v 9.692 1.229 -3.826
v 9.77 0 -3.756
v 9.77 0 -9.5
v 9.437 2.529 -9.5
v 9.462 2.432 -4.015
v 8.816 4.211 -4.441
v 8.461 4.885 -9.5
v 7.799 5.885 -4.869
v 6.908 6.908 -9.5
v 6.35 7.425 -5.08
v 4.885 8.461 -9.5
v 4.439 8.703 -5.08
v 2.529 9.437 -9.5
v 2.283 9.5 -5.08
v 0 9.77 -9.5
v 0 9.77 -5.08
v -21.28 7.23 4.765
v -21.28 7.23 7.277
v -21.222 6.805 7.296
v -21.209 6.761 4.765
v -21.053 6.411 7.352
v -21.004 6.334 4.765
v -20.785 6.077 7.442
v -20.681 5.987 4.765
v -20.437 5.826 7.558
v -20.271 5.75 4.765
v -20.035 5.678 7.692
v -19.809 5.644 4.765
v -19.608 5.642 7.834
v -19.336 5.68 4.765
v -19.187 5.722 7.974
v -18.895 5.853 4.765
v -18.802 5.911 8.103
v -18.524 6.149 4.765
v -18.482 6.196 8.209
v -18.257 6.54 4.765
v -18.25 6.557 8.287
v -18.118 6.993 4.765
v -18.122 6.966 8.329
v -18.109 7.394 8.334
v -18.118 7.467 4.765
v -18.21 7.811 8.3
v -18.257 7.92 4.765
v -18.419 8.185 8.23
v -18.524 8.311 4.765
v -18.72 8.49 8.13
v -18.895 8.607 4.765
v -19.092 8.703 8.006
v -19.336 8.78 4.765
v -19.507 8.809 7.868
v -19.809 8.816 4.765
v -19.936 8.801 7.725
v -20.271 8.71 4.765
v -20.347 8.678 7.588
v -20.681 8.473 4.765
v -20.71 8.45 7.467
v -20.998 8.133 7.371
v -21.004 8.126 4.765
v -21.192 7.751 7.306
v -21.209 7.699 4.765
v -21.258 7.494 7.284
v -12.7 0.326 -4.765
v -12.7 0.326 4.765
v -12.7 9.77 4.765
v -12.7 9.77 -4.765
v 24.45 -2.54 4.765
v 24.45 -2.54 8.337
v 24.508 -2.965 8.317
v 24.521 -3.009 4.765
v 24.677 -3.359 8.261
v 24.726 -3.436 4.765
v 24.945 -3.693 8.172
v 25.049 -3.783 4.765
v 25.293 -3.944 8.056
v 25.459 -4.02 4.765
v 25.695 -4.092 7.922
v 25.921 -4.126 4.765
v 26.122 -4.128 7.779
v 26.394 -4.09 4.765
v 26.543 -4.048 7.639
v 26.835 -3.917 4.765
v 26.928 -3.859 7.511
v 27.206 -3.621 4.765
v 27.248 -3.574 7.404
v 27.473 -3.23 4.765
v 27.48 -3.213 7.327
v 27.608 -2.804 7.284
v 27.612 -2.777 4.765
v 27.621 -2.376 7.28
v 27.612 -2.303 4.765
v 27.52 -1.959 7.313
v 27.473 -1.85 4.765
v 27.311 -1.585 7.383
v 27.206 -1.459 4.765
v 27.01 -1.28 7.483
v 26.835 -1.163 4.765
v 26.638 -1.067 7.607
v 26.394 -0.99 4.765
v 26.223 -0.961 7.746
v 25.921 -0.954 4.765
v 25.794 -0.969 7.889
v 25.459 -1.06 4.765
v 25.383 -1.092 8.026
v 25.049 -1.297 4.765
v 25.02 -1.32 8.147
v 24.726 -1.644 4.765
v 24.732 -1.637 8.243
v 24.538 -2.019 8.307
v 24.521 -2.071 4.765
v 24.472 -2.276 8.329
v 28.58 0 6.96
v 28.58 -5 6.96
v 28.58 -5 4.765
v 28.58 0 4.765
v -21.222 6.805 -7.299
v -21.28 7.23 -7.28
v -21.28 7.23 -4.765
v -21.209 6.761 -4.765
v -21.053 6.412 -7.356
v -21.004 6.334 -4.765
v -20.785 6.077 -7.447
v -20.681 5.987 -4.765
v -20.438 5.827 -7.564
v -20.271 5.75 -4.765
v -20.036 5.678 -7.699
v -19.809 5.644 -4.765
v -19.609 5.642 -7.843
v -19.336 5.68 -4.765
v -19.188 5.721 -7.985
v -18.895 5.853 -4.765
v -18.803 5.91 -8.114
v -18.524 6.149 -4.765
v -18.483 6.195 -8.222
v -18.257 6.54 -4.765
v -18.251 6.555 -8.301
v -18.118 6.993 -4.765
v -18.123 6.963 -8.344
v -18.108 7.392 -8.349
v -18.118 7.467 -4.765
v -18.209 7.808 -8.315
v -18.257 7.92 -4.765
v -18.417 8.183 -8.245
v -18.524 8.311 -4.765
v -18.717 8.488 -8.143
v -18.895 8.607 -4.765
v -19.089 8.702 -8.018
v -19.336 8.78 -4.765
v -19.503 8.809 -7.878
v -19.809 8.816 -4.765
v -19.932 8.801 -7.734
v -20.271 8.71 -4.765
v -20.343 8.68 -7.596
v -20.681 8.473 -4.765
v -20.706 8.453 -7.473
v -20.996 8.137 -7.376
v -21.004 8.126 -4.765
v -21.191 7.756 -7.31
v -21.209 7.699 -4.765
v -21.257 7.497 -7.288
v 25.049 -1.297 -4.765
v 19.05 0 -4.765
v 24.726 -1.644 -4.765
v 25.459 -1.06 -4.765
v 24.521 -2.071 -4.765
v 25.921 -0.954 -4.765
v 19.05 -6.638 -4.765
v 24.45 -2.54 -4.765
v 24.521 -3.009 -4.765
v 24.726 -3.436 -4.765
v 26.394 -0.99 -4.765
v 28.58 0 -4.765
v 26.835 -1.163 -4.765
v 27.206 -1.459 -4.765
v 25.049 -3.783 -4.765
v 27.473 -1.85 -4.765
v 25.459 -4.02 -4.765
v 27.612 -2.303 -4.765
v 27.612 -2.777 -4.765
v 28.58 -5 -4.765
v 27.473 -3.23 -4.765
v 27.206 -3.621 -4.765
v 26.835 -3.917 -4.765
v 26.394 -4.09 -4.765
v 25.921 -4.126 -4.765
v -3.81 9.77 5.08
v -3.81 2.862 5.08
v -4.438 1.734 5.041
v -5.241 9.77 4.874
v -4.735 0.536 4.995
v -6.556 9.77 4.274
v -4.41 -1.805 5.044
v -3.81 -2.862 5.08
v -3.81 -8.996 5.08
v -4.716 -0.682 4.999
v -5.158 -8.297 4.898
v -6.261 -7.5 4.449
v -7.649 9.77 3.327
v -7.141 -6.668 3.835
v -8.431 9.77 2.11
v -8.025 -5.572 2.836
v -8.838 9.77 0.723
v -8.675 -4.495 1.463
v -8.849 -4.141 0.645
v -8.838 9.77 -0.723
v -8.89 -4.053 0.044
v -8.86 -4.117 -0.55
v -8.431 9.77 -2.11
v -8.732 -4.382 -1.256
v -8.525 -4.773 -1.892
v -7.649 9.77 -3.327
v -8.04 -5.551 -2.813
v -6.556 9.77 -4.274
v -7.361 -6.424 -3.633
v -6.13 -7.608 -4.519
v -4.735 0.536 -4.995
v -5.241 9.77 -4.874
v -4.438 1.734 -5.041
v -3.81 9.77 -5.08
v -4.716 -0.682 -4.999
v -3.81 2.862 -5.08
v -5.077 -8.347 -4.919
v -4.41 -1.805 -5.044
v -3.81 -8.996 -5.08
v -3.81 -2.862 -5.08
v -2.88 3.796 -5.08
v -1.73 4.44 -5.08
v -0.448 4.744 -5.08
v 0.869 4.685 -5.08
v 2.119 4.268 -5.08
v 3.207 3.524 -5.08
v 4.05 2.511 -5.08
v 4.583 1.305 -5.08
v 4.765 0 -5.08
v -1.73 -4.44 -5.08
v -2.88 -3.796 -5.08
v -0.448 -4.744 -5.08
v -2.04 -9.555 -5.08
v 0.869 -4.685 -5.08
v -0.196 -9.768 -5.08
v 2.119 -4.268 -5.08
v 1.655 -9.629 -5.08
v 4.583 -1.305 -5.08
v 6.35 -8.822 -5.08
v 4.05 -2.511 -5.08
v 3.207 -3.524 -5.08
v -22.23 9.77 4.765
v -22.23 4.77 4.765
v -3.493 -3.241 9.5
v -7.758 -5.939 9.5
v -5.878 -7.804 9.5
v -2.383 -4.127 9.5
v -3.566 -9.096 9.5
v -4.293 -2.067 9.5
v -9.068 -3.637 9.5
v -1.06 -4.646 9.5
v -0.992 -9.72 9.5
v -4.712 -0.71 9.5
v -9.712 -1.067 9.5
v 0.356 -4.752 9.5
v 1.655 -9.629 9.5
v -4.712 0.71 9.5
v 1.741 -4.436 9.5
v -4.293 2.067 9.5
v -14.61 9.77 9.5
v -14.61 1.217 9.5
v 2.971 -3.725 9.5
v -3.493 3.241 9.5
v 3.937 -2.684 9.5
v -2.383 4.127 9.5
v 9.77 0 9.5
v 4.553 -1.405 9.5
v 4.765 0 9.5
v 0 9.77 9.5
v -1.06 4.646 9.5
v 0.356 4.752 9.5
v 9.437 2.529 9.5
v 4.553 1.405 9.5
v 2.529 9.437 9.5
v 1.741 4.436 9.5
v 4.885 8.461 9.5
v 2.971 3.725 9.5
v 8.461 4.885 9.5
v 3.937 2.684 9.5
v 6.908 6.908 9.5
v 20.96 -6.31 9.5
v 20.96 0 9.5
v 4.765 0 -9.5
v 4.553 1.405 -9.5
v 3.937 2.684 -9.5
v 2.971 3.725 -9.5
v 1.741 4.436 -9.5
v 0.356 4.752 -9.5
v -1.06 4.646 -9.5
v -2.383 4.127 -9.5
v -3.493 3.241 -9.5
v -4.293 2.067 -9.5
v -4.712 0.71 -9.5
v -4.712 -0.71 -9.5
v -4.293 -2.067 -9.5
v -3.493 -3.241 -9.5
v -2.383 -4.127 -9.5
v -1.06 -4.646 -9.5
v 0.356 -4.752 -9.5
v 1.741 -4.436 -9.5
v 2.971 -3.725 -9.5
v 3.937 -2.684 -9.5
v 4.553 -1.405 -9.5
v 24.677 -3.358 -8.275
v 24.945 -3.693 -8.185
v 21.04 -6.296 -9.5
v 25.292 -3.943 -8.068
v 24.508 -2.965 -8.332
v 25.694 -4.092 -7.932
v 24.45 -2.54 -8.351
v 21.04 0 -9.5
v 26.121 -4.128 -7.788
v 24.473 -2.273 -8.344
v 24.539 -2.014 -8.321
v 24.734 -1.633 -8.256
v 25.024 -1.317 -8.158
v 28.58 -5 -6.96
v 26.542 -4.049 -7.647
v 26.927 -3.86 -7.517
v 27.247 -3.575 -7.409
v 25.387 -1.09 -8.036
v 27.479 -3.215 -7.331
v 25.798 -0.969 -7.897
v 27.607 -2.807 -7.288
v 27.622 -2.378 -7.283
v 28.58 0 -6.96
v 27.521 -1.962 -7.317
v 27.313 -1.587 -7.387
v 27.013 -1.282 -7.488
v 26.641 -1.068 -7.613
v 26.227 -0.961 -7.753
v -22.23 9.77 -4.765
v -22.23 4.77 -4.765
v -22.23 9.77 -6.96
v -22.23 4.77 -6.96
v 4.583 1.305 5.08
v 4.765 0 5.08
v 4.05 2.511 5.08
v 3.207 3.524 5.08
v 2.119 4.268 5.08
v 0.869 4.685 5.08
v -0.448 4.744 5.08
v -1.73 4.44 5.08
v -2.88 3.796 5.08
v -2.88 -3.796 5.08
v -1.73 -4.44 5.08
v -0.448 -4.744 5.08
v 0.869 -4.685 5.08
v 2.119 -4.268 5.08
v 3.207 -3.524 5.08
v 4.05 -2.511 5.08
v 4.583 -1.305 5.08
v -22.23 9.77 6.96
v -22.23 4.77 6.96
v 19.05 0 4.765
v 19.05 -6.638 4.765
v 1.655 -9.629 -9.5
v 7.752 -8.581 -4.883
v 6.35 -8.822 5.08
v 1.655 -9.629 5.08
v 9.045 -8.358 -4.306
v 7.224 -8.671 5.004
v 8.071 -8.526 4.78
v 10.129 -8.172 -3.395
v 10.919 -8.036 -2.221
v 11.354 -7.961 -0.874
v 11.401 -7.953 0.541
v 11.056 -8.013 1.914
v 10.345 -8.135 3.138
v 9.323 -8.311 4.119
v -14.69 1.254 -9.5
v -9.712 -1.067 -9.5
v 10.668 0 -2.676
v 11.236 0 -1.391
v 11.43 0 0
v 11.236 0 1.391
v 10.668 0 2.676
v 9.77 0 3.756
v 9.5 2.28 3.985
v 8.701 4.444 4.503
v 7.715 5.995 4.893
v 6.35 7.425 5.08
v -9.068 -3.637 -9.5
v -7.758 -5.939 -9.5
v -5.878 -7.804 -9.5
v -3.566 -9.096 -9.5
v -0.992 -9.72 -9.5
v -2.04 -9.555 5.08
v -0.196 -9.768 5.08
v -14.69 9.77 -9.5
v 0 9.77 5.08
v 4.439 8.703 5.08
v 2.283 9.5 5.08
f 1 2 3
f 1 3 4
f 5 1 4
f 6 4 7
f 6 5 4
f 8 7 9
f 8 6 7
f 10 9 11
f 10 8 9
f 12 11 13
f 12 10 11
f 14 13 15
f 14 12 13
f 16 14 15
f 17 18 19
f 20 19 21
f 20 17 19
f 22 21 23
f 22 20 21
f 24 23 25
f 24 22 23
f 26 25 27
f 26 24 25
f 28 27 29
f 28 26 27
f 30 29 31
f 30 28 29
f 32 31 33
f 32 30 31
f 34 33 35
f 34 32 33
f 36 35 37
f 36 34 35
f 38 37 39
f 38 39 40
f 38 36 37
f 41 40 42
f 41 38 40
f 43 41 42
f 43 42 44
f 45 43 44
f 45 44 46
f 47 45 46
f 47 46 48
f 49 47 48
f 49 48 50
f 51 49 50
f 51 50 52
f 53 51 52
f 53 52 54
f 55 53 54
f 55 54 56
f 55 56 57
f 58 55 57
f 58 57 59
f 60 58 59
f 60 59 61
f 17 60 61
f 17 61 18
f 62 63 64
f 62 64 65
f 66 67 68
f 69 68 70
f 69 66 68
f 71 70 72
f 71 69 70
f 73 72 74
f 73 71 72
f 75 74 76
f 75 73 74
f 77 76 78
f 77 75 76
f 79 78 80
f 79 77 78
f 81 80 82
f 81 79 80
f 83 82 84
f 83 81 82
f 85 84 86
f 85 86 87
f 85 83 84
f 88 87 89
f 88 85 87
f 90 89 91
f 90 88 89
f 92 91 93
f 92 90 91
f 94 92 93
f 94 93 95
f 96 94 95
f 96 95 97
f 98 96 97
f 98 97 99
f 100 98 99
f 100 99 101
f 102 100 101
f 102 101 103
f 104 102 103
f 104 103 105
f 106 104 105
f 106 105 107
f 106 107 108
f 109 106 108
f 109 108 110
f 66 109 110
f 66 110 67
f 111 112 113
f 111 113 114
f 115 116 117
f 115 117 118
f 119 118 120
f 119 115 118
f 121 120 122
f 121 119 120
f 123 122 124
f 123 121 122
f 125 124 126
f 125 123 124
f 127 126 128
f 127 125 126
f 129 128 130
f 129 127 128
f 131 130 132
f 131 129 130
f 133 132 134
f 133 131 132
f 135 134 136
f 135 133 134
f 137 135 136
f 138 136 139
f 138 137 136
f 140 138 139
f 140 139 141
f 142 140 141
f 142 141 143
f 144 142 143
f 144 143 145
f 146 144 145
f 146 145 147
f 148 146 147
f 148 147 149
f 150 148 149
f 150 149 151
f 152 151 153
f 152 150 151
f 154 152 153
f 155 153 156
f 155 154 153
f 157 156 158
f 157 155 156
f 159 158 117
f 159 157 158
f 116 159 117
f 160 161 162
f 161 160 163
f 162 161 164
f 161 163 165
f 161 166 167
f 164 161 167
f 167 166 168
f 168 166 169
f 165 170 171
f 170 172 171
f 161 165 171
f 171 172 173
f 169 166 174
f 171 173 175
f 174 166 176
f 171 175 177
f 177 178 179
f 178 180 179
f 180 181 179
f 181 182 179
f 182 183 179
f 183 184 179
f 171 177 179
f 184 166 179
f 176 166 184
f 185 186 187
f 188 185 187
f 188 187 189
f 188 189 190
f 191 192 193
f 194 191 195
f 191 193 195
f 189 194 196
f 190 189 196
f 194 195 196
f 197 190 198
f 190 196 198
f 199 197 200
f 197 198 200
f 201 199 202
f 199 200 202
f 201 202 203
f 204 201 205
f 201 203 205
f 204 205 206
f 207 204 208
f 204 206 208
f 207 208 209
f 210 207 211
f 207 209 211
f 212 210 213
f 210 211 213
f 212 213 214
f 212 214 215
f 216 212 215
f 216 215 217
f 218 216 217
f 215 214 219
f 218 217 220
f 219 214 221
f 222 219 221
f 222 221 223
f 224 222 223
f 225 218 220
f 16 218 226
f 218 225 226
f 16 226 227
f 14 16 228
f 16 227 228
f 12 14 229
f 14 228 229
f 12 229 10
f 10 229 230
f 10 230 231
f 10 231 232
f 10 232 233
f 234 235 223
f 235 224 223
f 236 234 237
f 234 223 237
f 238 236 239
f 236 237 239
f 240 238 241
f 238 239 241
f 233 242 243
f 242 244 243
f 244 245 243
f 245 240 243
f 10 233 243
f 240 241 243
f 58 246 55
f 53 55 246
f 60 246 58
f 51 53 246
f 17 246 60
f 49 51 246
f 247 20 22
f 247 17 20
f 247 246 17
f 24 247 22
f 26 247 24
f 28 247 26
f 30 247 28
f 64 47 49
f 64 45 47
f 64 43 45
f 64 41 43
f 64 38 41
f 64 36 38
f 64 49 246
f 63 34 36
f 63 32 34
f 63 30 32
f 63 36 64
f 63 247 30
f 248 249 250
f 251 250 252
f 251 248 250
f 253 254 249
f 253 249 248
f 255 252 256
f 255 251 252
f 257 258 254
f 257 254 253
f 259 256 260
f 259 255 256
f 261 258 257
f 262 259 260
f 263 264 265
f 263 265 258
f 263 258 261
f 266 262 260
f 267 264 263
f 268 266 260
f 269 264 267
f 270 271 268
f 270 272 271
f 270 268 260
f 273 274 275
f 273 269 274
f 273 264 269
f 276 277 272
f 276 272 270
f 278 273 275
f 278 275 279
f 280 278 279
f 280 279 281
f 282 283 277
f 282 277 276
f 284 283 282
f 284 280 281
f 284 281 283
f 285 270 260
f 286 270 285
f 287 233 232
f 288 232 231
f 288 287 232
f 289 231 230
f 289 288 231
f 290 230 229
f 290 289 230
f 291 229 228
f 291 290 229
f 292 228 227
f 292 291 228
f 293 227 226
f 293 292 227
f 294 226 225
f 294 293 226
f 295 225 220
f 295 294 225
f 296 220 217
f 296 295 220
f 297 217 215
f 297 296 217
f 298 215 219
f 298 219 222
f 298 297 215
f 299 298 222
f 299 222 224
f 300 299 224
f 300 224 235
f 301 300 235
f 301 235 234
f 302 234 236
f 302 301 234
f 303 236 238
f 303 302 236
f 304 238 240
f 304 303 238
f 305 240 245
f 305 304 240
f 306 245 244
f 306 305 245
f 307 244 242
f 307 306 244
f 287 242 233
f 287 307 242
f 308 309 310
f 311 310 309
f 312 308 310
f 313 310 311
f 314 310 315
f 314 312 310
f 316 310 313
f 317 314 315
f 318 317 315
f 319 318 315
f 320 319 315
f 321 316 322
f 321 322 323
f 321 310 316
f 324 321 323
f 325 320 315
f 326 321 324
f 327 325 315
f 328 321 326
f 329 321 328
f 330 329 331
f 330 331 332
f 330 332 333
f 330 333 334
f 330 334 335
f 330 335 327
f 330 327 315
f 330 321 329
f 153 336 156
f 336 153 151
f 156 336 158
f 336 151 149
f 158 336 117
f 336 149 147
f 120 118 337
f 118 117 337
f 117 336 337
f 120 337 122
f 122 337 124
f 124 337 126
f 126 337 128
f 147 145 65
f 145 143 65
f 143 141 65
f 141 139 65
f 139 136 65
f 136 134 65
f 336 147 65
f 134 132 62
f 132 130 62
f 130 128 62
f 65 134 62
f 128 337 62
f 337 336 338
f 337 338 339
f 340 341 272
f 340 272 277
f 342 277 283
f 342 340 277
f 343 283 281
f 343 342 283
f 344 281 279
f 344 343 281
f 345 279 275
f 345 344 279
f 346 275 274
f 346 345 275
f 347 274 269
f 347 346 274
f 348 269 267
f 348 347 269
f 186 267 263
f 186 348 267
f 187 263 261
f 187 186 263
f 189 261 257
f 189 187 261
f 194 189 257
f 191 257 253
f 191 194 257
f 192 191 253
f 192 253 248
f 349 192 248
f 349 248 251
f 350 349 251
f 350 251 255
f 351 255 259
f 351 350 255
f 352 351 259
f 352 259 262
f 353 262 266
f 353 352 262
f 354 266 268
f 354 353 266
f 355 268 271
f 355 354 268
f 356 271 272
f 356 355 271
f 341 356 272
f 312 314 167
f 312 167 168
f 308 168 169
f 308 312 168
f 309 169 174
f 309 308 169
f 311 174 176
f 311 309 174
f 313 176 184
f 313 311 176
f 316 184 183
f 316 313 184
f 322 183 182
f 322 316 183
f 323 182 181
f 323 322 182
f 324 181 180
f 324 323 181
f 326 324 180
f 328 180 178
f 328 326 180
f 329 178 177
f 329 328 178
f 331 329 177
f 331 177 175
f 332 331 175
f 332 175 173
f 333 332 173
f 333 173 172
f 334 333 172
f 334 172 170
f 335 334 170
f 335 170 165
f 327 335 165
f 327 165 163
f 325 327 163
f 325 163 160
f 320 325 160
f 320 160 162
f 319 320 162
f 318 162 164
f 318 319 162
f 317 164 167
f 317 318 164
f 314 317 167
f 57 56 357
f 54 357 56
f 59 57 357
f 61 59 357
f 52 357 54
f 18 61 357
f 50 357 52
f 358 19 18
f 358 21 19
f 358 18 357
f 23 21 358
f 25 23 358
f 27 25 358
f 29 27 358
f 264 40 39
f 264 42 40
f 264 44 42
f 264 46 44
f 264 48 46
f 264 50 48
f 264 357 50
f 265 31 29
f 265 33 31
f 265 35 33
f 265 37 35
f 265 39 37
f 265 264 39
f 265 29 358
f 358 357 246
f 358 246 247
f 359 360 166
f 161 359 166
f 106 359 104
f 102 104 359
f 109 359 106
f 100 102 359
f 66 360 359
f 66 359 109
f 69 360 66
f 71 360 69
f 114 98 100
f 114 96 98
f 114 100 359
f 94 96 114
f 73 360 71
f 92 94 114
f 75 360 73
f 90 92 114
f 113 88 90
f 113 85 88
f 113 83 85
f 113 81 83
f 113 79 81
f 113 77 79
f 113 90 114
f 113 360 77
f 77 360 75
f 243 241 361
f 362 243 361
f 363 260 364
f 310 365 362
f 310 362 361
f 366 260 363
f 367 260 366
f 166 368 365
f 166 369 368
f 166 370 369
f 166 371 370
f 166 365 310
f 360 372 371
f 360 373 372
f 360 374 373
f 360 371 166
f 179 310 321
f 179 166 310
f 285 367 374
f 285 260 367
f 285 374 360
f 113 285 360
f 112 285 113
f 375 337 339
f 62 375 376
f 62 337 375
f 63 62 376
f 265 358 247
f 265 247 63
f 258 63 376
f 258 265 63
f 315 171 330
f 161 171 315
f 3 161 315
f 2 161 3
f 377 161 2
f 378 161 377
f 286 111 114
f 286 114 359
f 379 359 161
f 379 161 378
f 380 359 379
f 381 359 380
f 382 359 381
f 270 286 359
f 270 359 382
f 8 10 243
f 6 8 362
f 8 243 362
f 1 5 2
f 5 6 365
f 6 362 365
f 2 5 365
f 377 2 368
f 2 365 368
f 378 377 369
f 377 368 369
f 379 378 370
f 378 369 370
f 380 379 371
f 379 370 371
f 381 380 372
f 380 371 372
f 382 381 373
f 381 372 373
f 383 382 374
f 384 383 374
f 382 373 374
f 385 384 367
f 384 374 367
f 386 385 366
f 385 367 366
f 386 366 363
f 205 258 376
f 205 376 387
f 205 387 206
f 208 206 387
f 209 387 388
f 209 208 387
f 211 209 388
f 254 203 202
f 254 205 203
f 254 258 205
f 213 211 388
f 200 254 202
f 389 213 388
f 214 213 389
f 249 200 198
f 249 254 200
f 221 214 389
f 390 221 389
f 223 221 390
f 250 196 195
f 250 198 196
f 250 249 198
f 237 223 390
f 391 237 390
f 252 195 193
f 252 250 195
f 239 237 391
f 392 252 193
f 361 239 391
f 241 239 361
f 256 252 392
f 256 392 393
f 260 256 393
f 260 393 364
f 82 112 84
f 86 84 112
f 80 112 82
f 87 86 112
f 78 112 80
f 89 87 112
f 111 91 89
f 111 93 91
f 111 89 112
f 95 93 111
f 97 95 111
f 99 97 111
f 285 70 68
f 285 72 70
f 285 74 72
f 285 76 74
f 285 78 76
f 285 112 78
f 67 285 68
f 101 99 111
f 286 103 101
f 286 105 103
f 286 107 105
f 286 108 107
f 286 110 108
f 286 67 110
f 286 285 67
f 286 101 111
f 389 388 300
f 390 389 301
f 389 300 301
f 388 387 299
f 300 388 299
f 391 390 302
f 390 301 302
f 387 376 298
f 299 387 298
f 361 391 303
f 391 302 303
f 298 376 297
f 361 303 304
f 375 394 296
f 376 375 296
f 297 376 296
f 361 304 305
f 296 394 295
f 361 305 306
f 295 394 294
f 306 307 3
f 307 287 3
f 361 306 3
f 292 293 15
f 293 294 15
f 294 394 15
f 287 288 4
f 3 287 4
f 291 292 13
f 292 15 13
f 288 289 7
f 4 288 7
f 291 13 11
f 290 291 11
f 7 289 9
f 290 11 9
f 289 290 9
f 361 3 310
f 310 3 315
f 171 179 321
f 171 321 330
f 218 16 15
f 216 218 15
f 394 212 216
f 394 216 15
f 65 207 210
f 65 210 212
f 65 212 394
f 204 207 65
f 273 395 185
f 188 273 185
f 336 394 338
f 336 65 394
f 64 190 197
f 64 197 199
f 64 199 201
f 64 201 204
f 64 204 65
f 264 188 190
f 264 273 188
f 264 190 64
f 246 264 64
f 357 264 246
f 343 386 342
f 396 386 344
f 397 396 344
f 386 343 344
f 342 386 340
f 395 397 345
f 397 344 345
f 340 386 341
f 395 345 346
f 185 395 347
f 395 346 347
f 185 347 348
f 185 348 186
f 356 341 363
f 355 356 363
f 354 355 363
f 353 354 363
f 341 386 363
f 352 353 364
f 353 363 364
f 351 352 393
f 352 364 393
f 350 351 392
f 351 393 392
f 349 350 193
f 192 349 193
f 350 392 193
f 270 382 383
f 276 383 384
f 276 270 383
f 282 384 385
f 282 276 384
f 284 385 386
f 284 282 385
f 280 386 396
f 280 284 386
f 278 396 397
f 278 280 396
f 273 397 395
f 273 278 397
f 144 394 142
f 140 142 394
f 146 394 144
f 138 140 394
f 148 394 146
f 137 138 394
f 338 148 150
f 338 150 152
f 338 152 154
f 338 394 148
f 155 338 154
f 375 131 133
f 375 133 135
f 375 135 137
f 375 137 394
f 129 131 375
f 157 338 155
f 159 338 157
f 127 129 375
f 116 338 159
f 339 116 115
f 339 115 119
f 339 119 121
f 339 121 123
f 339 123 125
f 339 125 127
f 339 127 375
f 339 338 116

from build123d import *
from OCP.BRepFilletAPI import BRepFilletAPI_MakeChamfer

# Parameters (mm, degrees)
SKETCH1_R               = 4.765
BOSS_EXTRUDE1_DEPTH     = 9.5
CHAMFER4_SIZE           = 7.54
CHAMFER4_SIZE2          = 2.54
CHAMFER5_SIZE           = 2.54
CHAMFER5_SIZE2          = 7.62
CUT_EXTRUDE1_DEPTH      = 32.662585176
CUT_EXTRUDE1_DEPTH_BACK = 32.662585176
SKETCH2_W               = 9.53
SKETCH2_H               = 9.53
CUT_EXTRUDE2_DEPTH      = 32.662585176
CUT_EXTRUDE2_DEPTH_BACK = 32.662585176
CUT_EXTRUDE3_DEPTH      = 32.662585236
CUT_EXTRUDE3_DEPTH_BACK = 32.662585236
SKETCH4_R               = 1.59


with BuildPart() as part:
    # Sketch1 → Boss-Extrude1 (new, symmetric)
    with BuildSketch(Plane.XY):
        with BuildLine():
            Line((0, 9.77), (-22.23, 9.77))
            Line((-22.23, 9.77), (-22.23, 4.77))
            Line((-22.23, 4.77), (-9.711509246, -1.067468107))
            ThreePointArc((-9.711509246, -1.067468107), (-5.877874817, -7.804068659), (1.655323868, -9.628748771))
            Line((1.655323868, -9.628748771), (28.58, -5))
            Line((28.58, -5), (28.58, 0))
            Line((28.58, 0), (9.77, 0))
            ThreePointArc((9.77, 0), (6.908433252, 6.908433252), (0, 9.77))
        make_face()
        Circle(SKETCH1_R, mode=Mode.SUBTRACT)
    extrude(amount=BOSS_EXTRUDE1_DEPTH, both=True)

    # Chamfer4
    chamfer4_edges = [part.edges().sort_by_distance(p)[0] for p in [
        (-22.23, 7.27, -9.5),
        (28.58, -2.5, -9.5),
    ]]
    chamfer4_side = [part.faces().sort_by_distance(p)[0] for p in [
        (-11.115, 9.225622585, -9.5),
    ]]
    chamfer(chamfer4_edges, length=CHAMFER4_SIZE, length2=CHAMFER4_SIZE2, reference=chamfer4_side[0])

    # Chamfer5: one chamfer whose edges measure the first distance from different faces: ONE call of the kernel's chamfer builder (chamfer() names one face for all edges)
    chamfer5_edges_1 = [part.edges().sort_by_distance(p)[0] for p in [
        (-22.23, 7.27, 9.5),
    ]]
    chamfer5_side_1 = [part.faces().sort_by_distance(p)[0] for p in [
        (-22.23, 7.27, 1.27),
    ]]
    chamfer5_edges_2 = [part.edges().sort_by_distance(p)[0] for p in [
        (28.58, -2.5, 9.5),
    ]]
    chamfer5_side_2 = [part.faces().sort_by_distance(p)[0] for p in [
        (28.58, -2.5, 1.27),
    ]]
    chamfer5 = BRepFilletAPI_MakeChamfer(part.part.solid().wrapped)
    for e in chamfer5_edges_1:
        chamfer5.Add(CHAMFER5_SIZE, CHAMFER5_SIZE2, e.wrapped, chamfer5_side_1[0].wrapped)  # the first distance lies on this face
    for e in chamfer5_edges_2:
        chamfer5.Add(CHAMFER5_SIZE, CHAMFER5_SIZE2, e.wrapped, chamfer5_side_2[0].wrapped)  # the first distance lies on this face
    add(Compound.cast(chamfer5.Shape()), mode=Mode.REPLACE)

    # Sketch2 → Cut-Extrude1 (cut, two sides: drawn at the far end of the back side and taken through both)
    with BuildSketch(Plane(origin=(0, 0, 0), x_dir=(1, 0, 0), z_dir=(0, 1, 0)).offset(-CUT_EXTRUDE1_DEPTH_BACK)):
        with Locations((-17.465, 0)):
            Rectangle(SKETCH2_W, SKETCH2_H)
        with Locations((23.815, 0)):
            Rectangle(SKETCH2_W, SKETCH2_H)
    extrude(amount=CUT_EXTRUDE1_DEPTH + CUT_EXTRUDE1_DEPTH_BACK, mode=Mode.SUBTRACT)

    # Sketch3 → Cut-Extrude2 (cut, two sides: drawn at the far end of the back side and taken through both)
    with BuildSketch(Plane(origin=(0, 0, 0), x_dir=(1, 0, 0), z_dir=(0, 1, 0)).offset(-CUT_EXTRUDE2_DEPTH_BACK)):
        with BuildLine():
            Line((-3.81, 5.08), (6.35, 5.08))
            ThreePointArc((6.35, 5.08), (11.43, 0), (6.35, -5.08))
            Line((6.35, -5.08), (-3.81, -5.08))
            ThreePointArc((-3.81, -5.08), (-8.89, 0), (-3.81, 5.08))
        make_face()
    extrude(amount=CUT_EXTRUDE2_DEPTH + CUT_EXTRUDE2_DEPTH_BACK, mode=Mode.SUBTRACT)

    # Sketch4 → Cut-Extrude3 (cut, two sides: drawn at the far end of the back side and taken through both)
    with BuildSketch(Plane.XY.offset(-CUT_EXTRUDE3_DEPTH_BACK)):
        with Locations(Location((-19.69, 7.23, 0), (0, 0, 180))):
            Circle(SKETCH4_R)
        with Locations(Location((26.04, -2.54, 0), (0, 0, 180))):
            Circle(SKETCH4_R)
    extrude(amount=CUT_EXTRUDE3_DEPTH + CUT_EXTRUDE3_DEPTH_BACK, mode=Mode.SUBTRACT)


solid = part.part
